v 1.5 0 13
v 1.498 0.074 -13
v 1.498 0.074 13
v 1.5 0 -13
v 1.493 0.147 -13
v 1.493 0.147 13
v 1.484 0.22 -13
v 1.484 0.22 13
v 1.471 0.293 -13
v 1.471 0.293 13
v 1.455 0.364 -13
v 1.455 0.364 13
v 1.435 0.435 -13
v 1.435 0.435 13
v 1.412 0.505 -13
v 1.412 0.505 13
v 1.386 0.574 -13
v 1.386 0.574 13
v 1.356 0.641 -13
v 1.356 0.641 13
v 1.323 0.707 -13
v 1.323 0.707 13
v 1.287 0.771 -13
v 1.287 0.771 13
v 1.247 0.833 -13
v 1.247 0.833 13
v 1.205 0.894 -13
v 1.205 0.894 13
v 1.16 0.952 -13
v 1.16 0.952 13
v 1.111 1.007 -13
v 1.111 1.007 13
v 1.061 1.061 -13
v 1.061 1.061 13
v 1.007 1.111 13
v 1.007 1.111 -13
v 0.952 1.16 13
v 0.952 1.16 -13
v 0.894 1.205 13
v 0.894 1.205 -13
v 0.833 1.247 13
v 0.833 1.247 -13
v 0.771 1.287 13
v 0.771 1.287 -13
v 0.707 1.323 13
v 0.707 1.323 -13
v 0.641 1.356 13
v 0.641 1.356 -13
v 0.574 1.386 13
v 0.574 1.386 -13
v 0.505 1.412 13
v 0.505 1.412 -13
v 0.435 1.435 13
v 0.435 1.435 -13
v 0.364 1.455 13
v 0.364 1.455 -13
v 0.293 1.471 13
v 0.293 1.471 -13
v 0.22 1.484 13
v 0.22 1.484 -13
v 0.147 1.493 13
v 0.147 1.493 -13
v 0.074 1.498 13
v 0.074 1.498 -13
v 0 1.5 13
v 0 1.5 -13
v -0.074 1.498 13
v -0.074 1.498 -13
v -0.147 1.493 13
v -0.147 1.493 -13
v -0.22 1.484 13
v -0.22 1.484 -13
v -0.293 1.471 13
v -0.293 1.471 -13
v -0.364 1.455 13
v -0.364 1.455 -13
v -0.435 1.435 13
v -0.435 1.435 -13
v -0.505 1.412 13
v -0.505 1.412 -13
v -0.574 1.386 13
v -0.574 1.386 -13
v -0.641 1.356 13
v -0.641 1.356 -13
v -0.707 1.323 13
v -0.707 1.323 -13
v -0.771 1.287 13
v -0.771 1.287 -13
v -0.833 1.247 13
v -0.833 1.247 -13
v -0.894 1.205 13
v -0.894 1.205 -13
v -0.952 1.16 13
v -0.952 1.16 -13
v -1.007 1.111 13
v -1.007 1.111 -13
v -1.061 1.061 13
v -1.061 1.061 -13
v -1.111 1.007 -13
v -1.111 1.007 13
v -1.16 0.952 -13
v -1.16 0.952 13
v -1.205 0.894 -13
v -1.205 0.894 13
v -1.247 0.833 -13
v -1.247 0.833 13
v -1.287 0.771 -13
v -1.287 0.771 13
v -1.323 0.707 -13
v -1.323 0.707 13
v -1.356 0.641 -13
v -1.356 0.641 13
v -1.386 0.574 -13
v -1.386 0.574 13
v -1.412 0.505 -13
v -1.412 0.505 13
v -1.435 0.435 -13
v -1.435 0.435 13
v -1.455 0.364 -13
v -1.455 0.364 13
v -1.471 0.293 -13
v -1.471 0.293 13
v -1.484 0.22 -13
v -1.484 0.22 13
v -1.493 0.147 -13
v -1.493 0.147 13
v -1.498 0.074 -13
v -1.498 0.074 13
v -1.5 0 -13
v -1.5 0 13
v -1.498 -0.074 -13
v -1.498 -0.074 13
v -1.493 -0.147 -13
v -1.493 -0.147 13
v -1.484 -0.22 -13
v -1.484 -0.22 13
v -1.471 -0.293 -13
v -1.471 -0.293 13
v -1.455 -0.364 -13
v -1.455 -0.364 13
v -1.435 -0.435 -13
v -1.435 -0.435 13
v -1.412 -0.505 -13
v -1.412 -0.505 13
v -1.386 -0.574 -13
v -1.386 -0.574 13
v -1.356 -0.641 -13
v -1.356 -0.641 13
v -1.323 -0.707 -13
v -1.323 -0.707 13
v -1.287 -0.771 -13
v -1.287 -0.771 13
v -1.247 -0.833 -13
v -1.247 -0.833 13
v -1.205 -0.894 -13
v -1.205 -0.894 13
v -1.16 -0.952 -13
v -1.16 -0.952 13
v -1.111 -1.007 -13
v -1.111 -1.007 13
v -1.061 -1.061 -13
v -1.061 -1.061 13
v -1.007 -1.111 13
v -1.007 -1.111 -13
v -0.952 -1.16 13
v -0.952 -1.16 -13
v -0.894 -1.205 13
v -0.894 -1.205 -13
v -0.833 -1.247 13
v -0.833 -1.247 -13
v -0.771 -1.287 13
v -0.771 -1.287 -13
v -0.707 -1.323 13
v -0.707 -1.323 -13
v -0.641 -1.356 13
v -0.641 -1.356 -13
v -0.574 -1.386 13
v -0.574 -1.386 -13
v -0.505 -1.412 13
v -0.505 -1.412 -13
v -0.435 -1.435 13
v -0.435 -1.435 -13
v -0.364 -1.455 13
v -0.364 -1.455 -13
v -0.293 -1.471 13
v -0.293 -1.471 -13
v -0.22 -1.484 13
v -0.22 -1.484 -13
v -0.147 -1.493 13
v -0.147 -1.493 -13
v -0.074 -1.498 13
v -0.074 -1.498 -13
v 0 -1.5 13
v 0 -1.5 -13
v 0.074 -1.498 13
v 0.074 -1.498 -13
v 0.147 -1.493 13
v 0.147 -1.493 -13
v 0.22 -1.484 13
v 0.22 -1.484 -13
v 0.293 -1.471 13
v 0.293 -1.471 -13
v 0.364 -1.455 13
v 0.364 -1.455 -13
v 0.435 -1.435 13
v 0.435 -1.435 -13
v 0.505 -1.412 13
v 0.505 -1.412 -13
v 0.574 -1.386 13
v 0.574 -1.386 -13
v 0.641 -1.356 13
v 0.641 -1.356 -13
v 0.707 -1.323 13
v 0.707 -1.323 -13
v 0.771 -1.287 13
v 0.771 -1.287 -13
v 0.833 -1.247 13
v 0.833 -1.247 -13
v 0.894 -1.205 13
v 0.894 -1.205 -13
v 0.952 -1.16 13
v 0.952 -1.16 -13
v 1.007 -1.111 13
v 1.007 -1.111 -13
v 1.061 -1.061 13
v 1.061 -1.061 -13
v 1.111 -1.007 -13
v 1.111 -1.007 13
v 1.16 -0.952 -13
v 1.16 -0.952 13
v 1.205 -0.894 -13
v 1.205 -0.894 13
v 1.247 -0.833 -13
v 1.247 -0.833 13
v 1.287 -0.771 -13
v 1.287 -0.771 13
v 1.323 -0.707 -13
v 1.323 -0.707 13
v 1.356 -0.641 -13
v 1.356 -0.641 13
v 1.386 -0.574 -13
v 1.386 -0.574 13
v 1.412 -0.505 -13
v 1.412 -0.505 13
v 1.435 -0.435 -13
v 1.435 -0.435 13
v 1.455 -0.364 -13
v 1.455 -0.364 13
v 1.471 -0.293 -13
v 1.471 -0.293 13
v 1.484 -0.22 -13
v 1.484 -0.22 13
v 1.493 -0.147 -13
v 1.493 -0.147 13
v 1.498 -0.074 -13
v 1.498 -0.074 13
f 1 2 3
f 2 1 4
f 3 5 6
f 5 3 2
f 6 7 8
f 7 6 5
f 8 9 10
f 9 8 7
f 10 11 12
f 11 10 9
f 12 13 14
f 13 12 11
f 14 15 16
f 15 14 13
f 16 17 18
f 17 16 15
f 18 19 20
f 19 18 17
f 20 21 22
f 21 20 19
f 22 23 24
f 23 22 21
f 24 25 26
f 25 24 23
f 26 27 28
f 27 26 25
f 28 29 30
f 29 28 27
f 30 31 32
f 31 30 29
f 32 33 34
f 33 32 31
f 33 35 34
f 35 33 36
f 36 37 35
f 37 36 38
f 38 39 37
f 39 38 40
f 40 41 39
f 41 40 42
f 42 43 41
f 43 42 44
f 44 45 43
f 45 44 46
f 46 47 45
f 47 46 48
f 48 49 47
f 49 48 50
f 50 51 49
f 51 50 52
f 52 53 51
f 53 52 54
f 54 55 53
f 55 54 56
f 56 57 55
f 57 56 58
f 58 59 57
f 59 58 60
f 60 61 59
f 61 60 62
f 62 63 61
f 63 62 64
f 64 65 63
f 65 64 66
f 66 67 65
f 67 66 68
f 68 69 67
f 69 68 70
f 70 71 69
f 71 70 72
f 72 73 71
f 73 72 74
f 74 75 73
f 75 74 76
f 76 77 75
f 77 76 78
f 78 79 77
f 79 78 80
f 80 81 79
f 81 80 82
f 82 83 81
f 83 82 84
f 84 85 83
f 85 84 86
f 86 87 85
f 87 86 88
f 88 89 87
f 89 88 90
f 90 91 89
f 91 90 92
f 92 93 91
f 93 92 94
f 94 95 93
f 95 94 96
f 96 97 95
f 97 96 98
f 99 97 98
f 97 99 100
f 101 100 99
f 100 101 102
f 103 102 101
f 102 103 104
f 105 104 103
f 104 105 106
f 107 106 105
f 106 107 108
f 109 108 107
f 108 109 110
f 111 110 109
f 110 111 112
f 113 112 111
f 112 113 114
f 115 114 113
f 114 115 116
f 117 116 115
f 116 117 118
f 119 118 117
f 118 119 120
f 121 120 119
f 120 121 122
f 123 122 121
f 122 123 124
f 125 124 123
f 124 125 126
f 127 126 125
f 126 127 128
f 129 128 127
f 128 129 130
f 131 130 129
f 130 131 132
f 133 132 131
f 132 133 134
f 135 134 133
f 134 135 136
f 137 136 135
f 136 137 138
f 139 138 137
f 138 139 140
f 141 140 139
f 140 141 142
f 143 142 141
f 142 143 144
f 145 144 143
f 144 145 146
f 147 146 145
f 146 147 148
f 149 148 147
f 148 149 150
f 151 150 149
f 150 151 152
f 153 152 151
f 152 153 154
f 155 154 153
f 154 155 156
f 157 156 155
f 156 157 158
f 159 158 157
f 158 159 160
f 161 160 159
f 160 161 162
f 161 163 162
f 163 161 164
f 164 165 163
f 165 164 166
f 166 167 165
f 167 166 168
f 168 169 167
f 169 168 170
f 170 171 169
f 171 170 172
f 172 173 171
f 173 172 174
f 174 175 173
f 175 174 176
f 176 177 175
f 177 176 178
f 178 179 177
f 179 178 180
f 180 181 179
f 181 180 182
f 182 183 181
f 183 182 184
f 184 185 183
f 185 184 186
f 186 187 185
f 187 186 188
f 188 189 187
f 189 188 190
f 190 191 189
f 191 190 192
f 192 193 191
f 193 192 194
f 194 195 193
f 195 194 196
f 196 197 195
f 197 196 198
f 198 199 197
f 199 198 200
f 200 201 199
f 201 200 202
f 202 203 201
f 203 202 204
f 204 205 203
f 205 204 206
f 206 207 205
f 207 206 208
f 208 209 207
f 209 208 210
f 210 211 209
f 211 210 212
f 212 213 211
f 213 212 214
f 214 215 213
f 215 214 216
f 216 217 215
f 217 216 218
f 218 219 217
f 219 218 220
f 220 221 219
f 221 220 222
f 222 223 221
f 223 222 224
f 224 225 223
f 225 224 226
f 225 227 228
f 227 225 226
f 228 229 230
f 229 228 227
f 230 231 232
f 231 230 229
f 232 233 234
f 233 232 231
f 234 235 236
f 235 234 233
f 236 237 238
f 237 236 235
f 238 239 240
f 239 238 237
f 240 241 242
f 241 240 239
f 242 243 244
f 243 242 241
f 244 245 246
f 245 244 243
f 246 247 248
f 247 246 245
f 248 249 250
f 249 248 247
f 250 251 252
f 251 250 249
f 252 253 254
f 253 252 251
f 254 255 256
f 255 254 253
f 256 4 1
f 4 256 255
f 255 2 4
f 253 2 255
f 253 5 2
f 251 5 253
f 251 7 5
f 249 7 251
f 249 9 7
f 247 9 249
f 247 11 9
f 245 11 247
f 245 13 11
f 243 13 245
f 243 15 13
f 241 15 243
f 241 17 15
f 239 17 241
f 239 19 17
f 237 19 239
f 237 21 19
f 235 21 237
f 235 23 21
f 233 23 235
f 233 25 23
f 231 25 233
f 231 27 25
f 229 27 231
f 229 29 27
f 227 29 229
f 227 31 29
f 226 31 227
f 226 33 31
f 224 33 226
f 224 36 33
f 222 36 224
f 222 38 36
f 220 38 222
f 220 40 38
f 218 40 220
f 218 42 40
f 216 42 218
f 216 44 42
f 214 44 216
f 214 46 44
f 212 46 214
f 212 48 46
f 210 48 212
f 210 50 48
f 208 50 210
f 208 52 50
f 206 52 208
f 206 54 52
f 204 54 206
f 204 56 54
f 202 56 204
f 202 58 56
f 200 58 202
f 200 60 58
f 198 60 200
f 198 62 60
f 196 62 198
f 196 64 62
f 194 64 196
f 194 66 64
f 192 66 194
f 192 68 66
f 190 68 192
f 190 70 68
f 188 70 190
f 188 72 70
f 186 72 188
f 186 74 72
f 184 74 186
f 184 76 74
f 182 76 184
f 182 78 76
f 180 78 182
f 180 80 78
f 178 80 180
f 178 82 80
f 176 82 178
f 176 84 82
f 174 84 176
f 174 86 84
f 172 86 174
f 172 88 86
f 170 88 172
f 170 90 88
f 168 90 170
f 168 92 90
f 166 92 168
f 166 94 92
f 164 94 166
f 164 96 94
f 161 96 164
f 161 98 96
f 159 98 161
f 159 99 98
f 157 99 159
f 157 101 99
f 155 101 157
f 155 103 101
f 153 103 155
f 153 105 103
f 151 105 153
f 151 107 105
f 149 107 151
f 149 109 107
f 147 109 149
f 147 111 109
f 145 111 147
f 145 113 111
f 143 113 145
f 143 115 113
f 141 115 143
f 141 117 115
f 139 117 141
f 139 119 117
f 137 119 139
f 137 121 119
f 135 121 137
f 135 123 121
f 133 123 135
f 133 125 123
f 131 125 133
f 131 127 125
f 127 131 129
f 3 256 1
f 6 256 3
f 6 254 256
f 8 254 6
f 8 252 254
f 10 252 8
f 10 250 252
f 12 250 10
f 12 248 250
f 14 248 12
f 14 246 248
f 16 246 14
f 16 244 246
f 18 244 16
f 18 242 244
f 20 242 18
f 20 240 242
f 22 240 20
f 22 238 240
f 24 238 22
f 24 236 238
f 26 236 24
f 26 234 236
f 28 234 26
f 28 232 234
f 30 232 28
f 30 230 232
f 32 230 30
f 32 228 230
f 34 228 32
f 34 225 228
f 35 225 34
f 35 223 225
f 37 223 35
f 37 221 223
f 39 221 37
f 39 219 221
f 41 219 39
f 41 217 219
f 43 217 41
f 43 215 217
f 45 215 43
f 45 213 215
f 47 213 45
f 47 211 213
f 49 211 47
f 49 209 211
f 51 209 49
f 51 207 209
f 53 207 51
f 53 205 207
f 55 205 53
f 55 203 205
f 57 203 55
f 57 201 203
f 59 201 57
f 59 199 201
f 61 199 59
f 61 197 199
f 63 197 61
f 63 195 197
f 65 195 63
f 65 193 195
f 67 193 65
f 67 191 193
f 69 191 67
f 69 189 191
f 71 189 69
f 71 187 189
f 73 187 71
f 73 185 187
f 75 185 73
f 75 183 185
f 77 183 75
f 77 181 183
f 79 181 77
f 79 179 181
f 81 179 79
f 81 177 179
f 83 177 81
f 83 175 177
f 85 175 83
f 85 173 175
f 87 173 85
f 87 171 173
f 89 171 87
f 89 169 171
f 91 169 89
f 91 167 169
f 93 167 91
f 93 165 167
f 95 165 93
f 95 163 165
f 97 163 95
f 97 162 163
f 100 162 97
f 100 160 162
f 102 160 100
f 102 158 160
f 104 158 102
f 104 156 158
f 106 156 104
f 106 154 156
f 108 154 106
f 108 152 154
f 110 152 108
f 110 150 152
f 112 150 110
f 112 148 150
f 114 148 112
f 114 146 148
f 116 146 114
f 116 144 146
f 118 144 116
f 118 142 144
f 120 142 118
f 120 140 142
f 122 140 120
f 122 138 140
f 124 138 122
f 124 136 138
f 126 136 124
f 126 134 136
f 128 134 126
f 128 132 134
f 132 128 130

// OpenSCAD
// Simple solid right circular cylinder (rod)
// Bounding box: 3.0 x 3.0 x 26.0 mm

$fn = 128;  // ensure circular appearance in orthographic views

shaft_diameter = 3.0; //[1.5:6.0:0.1]
shaft_length   = 26.0; //[13.0:52.0:0.5]

cylinder(h = shaft_length, d = shaft_diameter, center = true);
